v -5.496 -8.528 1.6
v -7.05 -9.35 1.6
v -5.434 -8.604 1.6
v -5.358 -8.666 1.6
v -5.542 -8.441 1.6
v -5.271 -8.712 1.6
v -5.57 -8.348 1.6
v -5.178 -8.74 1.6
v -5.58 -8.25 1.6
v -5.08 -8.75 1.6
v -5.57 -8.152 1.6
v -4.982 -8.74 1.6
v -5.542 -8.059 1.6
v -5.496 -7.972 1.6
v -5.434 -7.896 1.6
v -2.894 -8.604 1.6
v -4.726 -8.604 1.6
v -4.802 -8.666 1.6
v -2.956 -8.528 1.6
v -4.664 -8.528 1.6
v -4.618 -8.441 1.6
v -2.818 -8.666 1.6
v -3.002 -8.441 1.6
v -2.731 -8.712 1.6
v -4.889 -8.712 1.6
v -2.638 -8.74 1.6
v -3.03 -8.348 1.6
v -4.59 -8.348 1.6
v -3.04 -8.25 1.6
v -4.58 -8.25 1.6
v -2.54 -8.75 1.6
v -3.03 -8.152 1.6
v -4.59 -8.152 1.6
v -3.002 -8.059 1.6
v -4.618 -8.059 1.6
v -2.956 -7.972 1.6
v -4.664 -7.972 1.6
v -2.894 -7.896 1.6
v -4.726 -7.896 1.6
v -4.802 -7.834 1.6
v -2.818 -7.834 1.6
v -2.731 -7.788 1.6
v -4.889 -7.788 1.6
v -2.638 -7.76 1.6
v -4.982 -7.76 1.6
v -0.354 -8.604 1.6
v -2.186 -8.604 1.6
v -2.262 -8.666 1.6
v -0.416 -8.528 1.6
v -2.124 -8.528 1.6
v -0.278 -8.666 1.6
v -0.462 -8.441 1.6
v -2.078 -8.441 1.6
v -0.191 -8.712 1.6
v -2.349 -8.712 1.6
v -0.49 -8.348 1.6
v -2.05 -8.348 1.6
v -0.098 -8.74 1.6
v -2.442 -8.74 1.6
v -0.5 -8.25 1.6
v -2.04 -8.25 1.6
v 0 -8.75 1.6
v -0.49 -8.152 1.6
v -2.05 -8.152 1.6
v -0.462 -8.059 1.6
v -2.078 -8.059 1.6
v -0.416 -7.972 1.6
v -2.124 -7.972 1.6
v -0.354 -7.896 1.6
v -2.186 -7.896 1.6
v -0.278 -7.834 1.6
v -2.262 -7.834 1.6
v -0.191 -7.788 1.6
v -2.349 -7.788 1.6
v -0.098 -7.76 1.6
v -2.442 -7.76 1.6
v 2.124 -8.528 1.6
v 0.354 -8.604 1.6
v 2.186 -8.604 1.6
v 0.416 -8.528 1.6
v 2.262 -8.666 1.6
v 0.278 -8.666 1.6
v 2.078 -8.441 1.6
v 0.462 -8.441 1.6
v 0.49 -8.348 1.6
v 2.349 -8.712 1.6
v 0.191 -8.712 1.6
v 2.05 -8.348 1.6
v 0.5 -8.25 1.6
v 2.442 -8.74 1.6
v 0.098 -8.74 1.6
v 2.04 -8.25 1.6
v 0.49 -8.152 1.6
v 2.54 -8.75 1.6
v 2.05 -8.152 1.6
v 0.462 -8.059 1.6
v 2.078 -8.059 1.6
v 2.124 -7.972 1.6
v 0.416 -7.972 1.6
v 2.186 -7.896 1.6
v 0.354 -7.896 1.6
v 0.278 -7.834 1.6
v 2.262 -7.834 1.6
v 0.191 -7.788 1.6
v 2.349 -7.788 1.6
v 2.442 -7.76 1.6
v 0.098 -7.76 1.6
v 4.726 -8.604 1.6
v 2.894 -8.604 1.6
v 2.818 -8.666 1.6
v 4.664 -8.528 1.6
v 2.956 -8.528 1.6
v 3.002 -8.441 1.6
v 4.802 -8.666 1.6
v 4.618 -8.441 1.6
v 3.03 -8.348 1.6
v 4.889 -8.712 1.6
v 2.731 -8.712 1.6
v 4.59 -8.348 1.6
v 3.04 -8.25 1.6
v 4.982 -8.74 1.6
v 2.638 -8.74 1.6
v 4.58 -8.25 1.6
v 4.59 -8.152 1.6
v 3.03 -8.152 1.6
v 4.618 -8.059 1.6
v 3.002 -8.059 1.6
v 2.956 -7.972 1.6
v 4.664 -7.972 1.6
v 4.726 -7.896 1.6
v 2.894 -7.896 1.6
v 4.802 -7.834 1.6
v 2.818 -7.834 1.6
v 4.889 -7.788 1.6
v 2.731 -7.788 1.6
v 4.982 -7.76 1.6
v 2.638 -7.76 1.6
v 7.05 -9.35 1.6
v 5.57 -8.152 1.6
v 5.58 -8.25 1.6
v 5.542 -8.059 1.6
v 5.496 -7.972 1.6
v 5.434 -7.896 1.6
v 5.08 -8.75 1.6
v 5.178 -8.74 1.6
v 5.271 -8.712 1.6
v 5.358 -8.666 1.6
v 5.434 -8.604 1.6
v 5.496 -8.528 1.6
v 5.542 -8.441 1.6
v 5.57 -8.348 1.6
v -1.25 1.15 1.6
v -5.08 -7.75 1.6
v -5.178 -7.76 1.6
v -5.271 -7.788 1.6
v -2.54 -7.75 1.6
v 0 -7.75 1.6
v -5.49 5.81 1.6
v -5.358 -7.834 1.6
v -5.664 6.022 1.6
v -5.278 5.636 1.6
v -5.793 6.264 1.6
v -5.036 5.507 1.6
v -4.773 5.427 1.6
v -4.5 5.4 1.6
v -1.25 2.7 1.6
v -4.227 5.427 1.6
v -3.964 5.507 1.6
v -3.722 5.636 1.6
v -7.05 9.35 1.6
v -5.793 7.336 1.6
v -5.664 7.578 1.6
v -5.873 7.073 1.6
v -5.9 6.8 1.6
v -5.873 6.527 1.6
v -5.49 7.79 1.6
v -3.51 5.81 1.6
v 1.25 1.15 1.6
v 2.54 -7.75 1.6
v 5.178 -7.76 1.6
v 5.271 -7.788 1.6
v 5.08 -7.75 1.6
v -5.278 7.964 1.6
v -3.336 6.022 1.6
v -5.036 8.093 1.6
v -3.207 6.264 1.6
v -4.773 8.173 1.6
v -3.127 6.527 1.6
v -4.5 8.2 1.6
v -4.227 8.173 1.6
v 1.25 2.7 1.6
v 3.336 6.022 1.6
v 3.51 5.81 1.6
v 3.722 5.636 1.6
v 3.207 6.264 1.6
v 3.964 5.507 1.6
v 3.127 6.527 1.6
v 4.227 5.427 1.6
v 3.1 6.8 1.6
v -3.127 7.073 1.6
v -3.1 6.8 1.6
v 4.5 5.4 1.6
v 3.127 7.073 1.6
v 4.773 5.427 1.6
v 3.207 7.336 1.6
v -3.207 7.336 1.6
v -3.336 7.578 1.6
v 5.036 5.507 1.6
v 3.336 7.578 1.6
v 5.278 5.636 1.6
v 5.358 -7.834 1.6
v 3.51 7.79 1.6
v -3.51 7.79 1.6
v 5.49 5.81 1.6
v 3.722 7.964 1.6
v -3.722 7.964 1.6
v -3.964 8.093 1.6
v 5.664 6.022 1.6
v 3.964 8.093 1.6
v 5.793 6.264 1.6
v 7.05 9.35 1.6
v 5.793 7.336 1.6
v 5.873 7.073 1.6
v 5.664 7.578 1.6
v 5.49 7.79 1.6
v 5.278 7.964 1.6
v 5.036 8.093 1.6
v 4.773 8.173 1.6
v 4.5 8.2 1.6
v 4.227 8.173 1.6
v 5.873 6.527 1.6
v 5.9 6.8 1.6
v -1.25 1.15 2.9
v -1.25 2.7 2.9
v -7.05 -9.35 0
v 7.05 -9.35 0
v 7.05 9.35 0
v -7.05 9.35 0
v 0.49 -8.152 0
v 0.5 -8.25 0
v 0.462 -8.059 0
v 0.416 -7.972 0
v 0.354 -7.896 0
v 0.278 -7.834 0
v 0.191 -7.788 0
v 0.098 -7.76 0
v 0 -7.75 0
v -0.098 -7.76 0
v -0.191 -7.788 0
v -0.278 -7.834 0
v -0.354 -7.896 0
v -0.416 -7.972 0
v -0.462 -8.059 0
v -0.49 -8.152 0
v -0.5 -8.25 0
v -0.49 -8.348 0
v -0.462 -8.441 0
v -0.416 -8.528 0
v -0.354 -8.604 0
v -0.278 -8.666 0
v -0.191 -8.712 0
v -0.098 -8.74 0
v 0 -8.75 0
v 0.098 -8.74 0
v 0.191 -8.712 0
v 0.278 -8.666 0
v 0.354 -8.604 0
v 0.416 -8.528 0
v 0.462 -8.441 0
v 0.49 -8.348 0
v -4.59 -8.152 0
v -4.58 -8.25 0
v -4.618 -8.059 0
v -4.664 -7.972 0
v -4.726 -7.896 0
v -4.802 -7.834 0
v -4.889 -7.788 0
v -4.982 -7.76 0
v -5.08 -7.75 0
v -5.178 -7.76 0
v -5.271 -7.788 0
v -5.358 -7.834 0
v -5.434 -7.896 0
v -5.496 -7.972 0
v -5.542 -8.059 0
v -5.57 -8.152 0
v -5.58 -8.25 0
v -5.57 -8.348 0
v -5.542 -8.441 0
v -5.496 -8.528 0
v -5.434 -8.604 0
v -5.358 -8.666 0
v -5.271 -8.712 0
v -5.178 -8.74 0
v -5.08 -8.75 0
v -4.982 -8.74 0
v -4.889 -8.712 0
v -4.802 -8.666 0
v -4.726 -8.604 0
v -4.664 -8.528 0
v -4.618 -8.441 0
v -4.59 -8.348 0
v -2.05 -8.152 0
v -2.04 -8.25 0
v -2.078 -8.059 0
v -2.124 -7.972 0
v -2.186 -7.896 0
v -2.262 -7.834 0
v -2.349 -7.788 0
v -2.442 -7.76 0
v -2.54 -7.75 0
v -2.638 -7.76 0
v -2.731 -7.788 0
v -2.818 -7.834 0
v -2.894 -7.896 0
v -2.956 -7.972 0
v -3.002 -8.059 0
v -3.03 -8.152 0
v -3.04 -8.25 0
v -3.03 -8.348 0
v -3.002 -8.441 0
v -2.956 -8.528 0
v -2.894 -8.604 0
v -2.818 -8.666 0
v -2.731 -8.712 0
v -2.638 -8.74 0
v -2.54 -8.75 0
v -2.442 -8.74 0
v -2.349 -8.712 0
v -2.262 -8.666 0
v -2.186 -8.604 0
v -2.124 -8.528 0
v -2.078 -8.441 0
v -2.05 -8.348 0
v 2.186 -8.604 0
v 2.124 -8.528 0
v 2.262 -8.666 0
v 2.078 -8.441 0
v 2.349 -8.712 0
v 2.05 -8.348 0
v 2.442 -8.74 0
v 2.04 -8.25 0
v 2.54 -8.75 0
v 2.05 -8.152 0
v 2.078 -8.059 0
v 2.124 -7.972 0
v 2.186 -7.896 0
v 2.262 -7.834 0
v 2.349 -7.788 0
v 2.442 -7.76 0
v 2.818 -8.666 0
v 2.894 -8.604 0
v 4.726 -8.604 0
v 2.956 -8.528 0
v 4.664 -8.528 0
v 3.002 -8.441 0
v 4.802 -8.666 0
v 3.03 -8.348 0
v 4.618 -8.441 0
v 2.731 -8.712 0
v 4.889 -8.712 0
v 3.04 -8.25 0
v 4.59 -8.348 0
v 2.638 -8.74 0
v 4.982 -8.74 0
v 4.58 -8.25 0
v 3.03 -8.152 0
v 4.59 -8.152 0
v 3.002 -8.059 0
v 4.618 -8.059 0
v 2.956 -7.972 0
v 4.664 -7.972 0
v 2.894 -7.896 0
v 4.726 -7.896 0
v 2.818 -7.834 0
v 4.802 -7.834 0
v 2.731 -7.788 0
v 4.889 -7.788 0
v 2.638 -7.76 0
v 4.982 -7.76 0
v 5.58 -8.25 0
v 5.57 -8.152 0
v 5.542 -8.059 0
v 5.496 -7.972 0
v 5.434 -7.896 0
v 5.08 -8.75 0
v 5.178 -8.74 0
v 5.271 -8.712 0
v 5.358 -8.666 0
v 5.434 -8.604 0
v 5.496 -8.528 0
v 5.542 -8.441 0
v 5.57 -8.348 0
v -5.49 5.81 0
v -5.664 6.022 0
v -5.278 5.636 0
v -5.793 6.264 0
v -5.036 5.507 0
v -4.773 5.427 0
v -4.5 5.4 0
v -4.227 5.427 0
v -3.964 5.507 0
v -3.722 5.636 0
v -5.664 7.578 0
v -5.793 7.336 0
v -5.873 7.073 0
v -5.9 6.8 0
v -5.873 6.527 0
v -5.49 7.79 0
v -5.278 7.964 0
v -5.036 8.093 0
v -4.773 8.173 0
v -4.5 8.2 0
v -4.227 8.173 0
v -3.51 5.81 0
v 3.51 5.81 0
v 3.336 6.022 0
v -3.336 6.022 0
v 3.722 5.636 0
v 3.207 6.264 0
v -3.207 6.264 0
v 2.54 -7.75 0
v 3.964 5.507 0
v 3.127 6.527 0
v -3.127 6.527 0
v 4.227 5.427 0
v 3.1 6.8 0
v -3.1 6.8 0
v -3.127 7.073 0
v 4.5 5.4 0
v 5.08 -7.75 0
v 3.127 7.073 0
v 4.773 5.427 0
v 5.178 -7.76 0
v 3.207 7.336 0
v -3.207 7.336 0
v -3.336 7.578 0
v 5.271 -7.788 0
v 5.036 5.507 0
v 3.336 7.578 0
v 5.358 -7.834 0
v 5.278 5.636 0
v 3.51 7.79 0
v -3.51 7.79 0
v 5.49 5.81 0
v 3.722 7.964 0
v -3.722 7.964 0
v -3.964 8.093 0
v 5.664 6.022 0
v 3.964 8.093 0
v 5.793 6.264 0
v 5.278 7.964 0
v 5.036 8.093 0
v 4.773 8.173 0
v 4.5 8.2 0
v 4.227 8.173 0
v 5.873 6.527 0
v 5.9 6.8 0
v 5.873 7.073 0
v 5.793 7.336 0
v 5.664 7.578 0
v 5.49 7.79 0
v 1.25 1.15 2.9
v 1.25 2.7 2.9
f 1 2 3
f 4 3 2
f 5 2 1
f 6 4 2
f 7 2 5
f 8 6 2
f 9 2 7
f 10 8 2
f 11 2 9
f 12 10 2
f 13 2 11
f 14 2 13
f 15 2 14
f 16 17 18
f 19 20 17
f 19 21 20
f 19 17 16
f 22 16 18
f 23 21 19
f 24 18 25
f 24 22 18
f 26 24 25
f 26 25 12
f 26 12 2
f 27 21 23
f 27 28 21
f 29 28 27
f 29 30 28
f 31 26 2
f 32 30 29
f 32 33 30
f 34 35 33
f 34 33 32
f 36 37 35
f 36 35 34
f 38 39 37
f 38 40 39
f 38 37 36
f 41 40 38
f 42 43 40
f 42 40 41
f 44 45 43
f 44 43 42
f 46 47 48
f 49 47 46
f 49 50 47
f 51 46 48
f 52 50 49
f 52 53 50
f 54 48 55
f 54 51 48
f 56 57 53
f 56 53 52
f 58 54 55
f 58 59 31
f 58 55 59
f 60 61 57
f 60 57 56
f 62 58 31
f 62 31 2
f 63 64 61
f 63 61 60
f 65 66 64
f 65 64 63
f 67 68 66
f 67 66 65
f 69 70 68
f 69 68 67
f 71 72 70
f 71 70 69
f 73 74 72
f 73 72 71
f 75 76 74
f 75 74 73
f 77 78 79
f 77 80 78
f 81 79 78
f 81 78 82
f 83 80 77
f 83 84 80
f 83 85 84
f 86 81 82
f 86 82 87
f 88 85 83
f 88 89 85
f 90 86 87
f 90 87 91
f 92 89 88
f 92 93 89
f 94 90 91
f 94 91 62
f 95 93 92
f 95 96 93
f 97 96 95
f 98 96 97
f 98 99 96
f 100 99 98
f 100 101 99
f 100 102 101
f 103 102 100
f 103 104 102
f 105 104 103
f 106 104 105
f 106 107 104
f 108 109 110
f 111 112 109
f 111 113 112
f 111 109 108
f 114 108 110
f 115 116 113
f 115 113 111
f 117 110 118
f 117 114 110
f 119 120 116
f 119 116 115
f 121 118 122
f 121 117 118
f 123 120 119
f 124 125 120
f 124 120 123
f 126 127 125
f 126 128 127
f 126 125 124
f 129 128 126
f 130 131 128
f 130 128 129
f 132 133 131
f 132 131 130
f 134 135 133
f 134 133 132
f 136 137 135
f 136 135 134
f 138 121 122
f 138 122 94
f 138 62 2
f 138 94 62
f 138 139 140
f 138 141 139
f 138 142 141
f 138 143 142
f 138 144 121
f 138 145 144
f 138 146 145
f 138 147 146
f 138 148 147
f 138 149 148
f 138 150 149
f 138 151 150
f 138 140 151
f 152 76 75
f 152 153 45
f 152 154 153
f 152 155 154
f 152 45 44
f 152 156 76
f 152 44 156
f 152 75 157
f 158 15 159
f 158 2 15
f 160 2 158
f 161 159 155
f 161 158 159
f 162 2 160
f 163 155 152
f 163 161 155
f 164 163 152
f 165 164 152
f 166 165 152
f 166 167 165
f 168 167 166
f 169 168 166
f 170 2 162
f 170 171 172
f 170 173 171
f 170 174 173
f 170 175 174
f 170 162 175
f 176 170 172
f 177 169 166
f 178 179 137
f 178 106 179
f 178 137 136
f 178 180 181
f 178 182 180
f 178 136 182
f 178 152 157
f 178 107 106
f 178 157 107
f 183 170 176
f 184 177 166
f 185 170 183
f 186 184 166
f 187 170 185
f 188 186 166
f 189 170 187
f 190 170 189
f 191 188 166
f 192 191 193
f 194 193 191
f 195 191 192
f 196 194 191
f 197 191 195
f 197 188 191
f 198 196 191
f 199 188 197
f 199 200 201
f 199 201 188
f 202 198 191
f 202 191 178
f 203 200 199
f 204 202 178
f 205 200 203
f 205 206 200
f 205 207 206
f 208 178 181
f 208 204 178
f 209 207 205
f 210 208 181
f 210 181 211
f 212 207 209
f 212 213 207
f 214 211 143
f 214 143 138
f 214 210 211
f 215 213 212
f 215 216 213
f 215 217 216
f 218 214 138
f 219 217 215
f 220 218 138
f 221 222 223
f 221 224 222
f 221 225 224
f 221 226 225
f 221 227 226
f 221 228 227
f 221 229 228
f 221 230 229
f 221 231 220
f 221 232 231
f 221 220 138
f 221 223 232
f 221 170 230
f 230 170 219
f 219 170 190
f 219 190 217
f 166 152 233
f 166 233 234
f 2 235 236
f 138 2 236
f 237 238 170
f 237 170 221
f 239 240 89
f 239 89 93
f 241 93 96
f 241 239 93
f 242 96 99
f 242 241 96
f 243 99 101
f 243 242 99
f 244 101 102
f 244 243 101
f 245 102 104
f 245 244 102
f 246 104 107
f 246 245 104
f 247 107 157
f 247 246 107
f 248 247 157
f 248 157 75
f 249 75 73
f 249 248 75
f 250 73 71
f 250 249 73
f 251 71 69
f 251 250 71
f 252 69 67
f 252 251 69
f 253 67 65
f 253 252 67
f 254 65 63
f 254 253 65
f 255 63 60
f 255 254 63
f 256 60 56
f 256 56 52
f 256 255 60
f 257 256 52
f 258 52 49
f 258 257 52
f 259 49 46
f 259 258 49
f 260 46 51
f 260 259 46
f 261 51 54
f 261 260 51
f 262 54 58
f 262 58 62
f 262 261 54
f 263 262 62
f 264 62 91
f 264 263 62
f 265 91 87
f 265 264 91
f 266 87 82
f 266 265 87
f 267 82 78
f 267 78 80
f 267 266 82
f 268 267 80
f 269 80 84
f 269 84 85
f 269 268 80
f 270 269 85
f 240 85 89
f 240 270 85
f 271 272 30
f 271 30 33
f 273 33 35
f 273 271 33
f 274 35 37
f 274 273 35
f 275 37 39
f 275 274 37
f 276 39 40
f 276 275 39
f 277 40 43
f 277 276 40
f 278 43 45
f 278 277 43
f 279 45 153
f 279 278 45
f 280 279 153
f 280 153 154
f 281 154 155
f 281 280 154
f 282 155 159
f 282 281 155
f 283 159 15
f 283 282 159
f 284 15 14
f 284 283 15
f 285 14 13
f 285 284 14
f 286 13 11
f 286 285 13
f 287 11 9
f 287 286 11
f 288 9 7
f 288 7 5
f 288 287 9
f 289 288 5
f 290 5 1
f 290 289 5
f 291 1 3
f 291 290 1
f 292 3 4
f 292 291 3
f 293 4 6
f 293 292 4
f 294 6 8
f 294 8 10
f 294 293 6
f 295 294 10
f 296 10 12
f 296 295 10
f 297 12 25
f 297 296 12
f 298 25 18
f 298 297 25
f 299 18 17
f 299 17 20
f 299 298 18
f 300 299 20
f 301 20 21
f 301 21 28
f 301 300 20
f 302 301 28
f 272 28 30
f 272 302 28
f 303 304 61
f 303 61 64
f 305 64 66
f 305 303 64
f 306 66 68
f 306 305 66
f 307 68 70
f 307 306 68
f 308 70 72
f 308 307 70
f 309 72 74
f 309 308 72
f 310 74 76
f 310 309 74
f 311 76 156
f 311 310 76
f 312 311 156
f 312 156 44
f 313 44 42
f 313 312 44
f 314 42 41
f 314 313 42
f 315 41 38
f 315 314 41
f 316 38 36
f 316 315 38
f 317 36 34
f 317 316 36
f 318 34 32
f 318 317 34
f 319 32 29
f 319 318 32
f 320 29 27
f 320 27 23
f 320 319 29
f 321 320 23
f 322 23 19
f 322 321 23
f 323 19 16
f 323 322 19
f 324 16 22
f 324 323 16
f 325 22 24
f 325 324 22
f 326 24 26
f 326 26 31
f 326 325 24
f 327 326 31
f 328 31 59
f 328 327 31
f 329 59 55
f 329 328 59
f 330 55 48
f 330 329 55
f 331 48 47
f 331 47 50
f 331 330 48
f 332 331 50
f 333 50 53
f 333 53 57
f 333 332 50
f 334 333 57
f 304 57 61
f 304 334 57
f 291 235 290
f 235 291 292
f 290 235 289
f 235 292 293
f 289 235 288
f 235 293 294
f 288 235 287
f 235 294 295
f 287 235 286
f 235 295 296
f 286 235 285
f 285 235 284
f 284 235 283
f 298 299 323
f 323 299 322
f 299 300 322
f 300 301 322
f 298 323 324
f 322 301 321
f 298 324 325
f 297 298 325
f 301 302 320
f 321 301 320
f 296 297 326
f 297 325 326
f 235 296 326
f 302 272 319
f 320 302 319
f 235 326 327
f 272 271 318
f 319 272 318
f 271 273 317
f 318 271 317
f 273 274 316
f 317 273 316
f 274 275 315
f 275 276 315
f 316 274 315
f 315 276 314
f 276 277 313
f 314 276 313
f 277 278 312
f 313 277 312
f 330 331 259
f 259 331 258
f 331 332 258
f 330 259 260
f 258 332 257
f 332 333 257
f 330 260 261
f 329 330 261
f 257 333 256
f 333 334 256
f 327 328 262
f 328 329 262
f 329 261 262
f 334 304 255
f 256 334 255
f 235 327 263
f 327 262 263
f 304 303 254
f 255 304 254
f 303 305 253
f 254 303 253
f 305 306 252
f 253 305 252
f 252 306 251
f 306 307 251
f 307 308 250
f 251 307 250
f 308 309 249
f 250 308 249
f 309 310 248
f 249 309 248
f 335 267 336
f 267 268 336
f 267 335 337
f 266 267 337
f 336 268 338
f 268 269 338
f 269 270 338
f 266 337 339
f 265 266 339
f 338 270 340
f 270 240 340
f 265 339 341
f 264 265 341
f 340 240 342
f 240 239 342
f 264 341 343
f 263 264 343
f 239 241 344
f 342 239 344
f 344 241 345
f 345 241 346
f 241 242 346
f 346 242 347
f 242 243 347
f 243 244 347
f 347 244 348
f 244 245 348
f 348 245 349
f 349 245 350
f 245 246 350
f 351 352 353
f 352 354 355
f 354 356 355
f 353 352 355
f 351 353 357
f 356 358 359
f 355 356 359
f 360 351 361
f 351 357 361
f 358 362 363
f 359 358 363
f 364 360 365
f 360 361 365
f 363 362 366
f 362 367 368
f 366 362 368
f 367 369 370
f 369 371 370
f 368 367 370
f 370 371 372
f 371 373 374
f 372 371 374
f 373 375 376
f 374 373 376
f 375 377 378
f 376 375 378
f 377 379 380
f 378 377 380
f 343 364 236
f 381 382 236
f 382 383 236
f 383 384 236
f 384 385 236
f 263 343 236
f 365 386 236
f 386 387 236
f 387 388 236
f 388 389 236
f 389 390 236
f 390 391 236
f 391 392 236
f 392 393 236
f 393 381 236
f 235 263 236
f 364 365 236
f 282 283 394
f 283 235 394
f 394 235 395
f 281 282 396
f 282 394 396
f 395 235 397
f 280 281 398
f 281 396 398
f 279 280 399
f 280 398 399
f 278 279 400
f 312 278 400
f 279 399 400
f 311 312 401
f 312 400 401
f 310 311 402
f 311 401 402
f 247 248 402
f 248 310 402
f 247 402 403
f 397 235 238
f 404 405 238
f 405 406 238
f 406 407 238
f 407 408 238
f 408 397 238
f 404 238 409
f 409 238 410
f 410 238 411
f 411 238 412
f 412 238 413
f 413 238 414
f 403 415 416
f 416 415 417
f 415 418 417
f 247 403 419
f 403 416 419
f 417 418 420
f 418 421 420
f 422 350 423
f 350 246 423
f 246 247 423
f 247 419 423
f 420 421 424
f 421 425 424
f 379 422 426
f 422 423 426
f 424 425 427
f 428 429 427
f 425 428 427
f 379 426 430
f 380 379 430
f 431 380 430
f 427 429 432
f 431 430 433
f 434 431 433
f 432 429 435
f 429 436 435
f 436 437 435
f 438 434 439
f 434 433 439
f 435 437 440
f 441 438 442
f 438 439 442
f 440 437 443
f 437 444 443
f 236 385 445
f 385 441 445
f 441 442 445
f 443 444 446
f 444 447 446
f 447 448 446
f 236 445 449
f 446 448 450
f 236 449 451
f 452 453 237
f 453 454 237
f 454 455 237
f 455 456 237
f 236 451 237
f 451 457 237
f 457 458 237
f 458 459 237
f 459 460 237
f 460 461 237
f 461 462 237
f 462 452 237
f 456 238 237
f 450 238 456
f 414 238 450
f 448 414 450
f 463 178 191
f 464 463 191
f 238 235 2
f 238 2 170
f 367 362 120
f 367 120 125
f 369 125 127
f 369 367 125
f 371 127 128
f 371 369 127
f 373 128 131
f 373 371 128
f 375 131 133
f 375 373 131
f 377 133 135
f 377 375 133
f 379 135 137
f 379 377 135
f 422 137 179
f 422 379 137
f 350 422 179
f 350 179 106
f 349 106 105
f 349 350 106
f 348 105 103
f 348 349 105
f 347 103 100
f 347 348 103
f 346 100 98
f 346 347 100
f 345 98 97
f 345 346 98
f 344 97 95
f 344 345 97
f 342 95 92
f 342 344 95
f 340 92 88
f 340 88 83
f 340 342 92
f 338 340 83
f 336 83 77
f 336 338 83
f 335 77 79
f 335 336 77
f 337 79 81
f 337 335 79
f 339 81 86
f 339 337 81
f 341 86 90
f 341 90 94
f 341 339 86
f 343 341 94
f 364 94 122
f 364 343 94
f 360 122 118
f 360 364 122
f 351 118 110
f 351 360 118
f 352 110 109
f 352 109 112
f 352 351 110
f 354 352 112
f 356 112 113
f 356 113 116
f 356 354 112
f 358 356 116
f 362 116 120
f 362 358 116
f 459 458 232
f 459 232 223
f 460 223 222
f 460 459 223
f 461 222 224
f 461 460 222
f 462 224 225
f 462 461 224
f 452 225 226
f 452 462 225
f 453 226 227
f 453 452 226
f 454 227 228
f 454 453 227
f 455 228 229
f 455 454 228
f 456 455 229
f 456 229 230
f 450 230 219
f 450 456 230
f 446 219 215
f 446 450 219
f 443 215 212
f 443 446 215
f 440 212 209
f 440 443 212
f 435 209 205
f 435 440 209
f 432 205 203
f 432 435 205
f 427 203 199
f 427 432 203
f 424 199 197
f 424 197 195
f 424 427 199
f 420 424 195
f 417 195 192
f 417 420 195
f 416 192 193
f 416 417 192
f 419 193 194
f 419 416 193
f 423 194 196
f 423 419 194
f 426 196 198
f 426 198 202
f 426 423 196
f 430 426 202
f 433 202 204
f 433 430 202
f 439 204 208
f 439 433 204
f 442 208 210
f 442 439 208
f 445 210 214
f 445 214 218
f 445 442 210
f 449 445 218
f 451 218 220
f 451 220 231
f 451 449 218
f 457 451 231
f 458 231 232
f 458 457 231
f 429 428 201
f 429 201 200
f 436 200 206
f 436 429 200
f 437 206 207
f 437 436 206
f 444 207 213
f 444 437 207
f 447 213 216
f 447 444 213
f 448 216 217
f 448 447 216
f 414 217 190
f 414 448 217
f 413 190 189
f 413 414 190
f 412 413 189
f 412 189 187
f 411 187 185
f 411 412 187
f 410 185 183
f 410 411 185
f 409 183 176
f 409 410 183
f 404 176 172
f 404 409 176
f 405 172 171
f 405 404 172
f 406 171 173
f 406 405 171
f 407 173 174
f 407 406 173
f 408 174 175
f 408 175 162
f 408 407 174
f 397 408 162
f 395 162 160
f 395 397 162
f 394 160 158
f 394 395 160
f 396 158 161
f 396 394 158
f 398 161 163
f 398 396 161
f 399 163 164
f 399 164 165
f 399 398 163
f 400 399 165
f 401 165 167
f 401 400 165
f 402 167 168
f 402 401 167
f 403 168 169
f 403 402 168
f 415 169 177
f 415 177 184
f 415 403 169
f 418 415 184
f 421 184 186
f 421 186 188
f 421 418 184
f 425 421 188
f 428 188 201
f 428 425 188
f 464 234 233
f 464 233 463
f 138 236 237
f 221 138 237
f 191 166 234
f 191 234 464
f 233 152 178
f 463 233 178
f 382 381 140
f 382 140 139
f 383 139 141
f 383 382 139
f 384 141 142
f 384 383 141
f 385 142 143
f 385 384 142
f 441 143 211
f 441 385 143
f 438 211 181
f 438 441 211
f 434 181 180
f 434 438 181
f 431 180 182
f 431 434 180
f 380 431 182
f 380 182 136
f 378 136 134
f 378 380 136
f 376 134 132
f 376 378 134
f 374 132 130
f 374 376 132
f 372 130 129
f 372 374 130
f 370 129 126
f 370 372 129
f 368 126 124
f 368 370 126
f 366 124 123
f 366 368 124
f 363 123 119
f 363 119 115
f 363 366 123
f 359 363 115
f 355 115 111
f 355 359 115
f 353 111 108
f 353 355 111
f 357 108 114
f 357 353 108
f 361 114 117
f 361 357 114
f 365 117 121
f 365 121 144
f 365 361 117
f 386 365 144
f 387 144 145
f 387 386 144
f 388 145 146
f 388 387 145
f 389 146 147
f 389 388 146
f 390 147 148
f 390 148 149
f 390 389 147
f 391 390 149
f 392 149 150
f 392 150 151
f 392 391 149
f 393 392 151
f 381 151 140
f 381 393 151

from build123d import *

# Parameters (mm, degrees)
F0_W     = 14.1
F0_H     = 18.7
F0_R     = 0.5
F0_R_2   = 1.4
F1_DEPTH = 1.6
F2_W     = 2.5
F2_H     = 1.55
F3_DEPTH = 1.3


with BuildPart() as f1:
    # F0 (on Top) → F1 (new body)
    with BuildSketch(Plane.XY):
        Rectangle(F0_W, F0_H)
        with Locations((-5.08, -8.25)):
            Circle(F0_R, mode=Mode.SUBTRACT)
        with Locations((-2.54, -8.25)):
            Circle(F0_R, mode=Mode.SUBTRACT)
        with Locations((0, -8.25)):
            Circle(F0_R, mode=Mode.SUBTRACT)
        with Locations((2.54, -8.25)):
            Circle(F0_R, mode=Mode.SUBTRACT)
        with Locations((5.08, -8.25)):
            Circle(F0_R, mode=Mode.SUBTRACT)
        with Locations((-4.5, 6.8)):
            Circle(F0_R_2, mode=Mode.SUBTRACT)
        with Locations((4.5, 6.8)):
            Circle(F0_R_2, mode=Mode.SUBTRACT)
    extrude(amount=F1_DEPTH)

    # F2 (on face) → F3 (join)
    with BuildSketch(Plane.XY.offset(1.6)):
        with Locations((0, 1.925)):
            Rectangle(F2_W, F2_H)
    extrude(amount=F3_DEPTH)


solid = f1.part
